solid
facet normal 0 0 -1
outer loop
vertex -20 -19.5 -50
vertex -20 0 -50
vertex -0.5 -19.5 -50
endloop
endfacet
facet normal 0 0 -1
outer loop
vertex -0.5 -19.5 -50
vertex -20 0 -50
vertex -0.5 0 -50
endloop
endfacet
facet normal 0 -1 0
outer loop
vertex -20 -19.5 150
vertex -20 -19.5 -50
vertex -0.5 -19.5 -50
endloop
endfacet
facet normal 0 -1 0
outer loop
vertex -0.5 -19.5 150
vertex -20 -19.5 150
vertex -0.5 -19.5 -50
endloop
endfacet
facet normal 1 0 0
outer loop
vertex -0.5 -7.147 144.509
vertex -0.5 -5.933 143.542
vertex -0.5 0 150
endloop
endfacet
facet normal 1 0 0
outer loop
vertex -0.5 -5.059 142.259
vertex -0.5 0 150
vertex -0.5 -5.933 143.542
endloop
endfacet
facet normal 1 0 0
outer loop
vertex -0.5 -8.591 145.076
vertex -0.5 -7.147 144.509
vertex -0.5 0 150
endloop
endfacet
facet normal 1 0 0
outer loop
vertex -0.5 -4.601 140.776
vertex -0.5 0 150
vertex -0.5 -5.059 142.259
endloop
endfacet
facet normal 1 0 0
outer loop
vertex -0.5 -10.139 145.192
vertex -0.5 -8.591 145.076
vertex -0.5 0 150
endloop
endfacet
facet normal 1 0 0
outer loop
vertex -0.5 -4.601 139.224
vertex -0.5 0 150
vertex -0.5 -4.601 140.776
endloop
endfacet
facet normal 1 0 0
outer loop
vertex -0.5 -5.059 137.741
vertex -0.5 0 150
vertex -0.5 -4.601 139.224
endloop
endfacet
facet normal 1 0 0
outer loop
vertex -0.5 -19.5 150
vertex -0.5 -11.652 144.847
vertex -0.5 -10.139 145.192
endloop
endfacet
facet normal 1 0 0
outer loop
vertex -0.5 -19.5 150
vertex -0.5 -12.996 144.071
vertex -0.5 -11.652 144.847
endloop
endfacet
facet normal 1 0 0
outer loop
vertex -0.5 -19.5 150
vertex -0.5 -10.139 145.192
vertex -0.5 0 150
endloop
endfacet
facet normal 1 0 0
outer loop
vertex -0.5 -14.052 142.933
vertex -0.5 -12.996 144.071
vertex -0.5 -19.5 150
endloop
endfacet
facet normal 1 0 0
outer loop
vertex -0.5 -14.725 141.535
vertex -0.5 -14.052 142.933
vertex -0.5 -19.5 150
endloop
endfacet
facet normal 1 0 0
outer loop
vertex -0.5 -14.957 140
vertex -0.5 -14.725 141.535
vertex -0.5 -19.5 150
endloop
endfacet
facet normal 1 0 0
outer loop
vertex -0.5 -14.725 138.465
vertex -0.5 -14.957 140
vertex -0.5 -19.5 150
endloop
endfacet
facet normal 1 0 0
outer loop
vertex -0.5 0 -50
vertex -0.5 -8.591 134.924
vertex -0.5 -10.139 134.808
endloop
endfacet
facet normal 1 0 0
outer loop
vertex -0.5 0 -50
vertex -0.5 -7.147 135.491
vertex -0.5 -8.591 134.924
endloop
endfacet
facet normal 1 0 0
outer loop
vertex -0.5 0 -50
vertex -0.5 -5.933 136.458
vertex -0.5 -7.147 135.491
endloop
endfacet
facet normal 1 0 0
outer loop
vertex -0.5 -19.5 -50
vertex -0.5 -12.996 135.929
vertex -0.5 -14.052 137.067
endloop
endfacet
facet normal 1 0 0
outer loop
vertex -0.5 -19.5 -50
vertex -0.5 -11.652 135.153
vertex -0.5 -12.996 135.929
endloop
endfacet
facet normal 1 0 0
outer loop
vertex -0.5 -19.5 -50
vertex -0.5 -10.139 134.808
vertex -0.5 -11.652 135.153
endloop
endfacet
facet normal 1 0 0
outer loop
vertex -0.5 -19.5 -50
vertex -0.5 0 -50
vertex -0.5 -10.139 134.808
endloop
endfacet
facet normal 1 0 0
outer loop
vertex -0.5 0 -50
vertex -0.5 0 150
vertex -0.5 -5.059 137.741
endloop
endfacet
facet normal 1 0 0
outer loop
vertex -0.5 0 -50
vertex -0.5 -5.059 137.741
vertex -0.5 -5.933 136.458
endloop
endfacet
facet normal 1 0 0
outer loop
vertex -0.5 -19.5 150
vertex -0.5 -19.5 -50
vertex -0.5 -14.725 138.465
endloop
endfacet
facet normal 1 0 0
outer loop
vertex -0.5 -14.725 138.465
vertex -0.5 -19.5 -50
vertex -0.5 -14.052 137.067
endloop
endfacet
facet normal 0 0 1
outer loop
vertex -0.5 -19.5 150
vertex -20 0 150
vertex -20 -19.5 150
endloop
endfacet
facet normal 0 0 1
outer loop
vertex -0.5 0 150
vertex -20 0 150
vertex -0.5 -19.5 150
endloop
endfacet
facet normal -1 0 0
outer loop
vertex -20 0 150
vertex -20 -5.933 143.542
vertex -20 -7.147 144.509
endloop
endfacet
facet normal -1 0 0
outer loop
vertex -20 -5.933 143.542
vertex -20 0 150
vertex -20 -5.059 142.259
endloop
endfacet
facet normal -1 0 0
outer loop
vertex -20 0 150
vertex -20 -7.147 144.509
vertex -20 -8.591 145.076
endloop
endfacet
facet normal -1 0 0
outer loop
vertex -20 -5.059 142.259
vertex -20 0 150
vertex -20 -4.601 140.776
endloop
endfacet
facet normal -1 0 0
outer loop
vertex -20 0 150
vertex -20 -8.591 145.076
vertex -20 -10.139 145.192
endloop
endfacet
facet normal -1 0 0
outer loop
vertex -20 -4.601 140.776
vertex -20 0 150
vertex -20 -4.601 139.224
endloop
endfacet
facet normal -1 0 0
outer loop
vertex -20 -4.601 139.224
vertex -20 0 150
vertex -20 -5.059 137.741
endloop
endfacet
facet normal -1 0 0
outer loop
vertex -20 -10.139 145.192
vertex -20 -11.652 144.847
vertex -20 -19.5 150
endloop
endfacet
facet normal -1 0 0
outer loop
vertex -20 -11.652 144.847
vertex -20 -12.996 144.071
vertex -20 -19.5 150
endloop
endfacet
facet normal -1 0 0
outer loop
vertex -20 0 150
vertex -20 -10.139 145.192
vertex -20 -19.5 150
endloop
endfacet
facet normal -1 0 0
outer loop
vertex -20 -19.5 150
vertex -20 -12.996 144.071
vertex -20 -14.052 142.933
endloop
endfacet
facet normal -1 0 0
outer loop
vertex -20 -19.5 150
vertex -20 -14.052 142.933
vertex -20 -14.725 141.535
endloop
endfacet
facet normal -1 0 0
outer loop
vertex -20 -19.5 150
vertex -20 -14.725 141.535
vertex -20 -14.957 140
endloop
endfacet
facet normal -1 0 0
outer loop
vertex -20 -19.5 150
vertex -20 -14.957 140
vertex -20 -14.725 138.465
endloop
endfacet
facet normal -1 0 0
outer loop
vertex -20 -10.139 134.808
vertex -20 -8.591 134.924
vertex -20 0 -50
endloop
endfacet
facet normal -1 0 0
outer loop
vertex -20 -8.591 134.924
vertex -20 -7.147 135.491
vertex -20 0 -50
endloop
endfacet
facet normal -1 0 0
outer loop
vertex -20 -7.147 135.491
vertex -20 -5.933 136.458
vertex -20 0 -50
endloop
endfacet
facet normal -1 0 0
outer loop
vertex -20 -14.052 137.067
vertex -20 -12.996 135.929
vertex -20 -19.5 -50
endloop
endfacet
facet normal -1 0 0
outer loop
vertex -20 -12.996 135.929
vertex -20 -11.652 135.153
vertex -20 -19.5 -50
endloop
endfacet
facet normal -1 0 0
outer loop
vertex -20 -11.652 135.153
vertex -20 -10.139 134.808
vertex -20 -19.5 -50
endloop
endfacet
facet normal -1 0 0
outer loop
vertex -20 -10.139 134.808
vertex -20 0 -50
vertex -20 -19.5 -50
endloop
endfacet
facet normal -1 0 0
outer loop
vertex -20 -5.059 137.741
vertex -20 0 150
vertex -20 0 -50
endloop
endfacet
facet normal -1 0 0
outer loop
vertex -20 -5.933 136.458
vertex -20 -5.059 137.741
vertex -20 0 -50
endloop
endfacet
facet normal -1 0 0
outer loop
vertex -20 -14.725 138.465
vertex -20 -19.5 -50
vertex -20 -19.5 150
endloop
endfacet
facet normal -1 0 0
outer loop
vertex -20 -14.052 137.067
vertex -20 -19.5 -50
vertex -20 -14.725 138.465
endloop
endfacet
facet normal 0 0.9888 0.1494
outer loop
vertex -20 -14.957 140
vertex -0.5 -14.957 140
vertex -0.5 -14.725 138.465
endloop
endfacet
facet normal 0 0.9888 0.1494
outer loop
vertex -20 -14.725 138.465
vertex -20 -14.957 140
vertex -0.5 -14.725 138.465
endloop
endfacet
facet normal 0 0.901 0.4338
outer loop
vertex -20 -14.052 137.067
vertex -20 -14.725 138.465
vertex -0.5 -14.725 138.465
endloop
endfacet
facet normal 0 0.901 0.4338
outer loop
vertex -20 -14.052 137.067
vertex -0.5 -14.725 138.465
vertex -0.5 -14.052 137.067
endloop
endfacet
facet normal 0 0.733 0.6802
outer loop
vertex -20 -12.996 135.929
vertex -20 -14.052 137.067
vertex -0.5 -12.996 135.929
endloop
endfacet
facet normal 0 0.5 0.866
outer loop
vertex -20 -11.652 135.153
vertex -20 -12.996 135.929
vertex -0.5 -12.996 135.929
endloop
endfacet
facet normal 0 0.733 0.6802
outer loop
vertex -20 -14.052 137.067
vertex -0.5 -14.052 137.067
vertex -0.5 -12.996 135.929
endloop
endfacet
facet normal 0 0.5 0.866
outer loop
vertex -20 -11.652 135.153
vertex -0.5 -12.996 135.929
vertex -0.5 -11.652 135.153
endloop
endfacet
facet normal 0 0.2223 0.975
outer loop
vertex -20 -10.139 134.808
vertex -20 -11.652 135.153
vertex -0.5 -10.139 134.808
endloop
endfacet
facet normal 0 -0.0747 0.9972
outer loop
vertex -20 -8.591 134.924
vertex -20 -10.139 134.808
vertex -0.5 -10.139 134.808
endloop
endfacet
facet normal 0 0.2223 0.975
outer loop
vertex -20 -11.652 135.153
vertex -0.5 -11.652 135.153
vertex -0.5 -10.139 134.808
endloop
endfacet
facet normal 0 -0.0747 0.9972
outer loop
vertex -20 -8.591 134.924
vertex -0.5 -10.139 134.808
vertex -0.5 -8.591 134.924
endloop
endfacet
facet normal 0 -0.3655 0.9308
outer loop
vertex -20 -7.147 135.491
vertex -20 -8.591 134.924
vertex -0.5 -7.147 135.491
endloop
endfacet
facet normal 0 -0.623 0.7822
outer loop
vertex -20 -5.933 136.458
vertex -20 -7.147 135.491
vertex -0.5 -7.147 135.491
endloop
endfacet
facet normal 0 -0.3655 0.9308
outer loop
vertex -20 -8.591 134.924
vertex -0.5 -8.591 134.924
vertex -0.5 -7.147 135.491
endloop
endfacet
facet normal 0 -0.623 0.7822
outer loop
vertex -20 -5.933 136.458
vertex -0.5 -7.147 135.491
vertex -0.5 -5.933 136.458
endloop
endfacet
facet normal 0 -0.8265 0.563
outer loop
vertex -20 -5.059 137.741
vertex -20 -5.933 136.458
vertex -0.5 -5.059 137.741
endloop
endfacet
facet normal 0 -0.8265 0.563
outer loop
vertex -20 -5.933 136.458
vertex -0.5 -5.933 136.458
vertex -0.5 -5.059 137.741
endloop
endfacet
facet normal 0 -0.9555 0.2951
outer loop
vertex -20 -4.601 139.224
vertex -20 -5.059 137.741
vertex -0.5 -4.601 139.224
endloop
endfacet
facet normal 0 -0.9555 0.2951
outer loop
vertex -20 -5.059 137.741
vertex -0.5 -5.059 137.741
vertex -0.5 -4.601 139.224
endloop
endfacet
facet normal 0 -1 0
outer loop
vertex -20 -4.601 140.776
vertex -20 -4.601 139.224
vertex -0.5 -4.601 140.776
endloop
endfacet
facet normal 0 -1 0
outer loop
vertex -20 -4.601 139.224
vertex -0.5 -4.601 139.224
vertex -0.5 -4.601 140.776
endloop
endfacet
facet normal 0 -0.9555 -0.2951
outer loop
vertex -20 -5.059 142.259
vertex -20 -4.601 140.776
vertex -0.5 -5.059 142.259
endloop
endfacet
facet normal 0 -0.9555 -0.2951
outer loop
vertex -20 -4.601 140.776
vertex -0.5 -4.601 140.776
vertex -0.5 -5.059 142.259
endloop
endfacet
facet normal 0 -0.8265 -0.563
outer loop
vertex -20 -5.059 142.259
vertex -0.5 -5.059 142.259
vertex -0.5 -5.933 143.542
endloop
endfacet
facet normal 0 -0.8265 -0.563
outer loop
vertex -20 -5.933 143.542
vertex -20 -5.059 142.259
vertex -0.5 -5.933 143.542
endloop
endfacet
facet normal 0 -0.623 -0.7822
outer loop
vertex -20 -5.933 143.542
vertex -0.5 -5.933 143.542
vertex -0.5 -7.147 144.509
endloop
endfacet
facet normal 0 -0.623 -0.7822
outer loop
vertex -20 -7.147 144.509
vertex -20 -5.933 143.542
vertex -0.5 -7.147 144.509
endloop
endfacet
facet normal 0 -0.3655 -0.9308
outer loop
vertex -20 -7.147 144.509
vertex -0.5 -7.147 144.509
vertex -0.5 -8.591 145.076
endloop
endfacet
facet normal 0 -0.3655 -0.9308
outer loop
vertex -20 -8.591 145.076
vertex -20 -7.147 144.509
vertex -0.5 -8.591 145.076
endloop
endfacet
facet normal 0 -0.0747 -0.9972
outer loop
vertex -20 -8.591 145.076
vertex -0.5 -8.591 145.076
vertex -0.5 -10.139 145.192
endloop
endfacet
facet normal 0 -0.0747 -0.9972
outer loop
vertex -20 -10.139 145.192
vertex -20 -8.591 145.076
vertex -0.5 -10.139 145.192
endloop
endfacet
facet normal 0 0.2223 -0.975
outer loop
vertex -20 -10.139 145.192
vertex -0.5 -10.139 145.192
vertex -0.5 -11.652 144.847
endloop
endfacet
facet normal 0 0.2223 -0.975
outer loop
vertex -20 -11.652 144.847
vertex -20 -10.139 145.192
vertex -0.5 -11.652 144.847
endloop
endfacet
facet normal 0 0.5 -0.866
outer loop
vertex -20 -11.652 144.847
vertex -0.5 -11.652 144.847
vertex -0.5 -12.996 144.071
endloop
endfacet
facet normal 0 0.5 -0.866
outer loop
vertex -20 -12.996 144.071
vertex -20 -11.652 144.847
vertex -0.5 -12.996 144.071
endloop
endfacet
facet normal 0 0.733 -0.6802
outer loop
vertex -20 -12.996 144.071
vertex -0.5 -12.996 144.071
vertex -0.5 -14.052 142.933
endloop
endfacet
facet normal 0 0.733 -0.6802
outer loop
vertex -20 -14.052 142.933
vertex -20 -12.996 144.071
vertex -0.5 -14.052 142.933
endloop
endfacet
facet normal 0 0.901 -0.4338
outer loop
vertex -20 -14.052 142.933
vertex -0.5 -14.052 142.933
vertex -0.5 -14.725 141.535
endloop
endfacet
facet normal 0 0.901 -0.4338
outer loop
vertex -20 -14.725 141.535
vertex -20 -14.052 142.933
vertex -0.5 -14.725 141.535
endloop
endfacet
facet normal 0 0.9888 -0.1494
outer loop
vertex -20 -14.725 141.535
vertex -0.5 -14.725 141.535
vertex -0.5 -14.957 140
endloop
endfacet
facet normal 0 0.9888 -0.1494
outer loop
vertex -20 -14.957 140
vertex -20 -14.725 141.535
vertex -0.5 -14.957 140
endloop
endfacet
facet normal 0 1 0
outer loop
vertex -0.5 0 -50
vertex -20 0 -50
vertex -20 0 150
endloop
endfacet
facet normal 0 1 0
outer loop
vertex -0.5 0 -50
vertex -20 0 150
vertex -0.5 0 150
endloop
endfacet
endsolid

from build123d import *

# Parameters (mm, degrees)
F0_W     = 40
F0_H     = 100
F1_DEPTH = 40
F2_DEPTH = 100
F3_DEPTH = 20.5
F4_DEPTH = 20.5
F6_DEPTH = 25


with BuildPart() as f1:
    # F0 (on Front) → F1 (new body)
    with BuildSketch(Plane.XZ):
        Rectangle(F0_W, F0_H)
    extrude(amount=F1_DEPTH)

    # F2 (add): a face of the model
    f2_faces = [f1.faces().sort_by_distance(p)[0] for p in [
        (0, -20, 50),
    ]]
    extrude(f2_faces, amount=F2_DEPTH)

    # F3 (cut): a face of the model
    f3_faces = [f1.faces().sort_by_distance(p)[0] for p in [
        (20, -20, 50),
    ]]
    extrude(f3_faces, amount=-F3_DEPTH, mode=Mode.SUBTRACT)

    # F4 (cut): a face of the model
    f4_faces = [f1.faces().sort_by_distance(p)[0] for p in [
        (-10.25, -40, 50),
    ]]
    extrude(f4_faces, amount=-F4_DEPTH, mode=Mode.SUBTRACT)

    # F5 (on face) → F6 (cut)
    with BuildSketch(Plane.YZ.offset(-0.5)):
        with BuildLine():
            ThreePointArc((-4.5432102773, 140), (-9.75, 145.2067897227), (-14.9567897227, 140))
            ThreePointArc((-14.9567897227, 140), (-9.75, 134.7932102773), (-4.5432102773, 140))
        make_face()
    extrude(amount=-F6_DEPTH, mode=Mode.SUBTRACT)


solid = f1.part
